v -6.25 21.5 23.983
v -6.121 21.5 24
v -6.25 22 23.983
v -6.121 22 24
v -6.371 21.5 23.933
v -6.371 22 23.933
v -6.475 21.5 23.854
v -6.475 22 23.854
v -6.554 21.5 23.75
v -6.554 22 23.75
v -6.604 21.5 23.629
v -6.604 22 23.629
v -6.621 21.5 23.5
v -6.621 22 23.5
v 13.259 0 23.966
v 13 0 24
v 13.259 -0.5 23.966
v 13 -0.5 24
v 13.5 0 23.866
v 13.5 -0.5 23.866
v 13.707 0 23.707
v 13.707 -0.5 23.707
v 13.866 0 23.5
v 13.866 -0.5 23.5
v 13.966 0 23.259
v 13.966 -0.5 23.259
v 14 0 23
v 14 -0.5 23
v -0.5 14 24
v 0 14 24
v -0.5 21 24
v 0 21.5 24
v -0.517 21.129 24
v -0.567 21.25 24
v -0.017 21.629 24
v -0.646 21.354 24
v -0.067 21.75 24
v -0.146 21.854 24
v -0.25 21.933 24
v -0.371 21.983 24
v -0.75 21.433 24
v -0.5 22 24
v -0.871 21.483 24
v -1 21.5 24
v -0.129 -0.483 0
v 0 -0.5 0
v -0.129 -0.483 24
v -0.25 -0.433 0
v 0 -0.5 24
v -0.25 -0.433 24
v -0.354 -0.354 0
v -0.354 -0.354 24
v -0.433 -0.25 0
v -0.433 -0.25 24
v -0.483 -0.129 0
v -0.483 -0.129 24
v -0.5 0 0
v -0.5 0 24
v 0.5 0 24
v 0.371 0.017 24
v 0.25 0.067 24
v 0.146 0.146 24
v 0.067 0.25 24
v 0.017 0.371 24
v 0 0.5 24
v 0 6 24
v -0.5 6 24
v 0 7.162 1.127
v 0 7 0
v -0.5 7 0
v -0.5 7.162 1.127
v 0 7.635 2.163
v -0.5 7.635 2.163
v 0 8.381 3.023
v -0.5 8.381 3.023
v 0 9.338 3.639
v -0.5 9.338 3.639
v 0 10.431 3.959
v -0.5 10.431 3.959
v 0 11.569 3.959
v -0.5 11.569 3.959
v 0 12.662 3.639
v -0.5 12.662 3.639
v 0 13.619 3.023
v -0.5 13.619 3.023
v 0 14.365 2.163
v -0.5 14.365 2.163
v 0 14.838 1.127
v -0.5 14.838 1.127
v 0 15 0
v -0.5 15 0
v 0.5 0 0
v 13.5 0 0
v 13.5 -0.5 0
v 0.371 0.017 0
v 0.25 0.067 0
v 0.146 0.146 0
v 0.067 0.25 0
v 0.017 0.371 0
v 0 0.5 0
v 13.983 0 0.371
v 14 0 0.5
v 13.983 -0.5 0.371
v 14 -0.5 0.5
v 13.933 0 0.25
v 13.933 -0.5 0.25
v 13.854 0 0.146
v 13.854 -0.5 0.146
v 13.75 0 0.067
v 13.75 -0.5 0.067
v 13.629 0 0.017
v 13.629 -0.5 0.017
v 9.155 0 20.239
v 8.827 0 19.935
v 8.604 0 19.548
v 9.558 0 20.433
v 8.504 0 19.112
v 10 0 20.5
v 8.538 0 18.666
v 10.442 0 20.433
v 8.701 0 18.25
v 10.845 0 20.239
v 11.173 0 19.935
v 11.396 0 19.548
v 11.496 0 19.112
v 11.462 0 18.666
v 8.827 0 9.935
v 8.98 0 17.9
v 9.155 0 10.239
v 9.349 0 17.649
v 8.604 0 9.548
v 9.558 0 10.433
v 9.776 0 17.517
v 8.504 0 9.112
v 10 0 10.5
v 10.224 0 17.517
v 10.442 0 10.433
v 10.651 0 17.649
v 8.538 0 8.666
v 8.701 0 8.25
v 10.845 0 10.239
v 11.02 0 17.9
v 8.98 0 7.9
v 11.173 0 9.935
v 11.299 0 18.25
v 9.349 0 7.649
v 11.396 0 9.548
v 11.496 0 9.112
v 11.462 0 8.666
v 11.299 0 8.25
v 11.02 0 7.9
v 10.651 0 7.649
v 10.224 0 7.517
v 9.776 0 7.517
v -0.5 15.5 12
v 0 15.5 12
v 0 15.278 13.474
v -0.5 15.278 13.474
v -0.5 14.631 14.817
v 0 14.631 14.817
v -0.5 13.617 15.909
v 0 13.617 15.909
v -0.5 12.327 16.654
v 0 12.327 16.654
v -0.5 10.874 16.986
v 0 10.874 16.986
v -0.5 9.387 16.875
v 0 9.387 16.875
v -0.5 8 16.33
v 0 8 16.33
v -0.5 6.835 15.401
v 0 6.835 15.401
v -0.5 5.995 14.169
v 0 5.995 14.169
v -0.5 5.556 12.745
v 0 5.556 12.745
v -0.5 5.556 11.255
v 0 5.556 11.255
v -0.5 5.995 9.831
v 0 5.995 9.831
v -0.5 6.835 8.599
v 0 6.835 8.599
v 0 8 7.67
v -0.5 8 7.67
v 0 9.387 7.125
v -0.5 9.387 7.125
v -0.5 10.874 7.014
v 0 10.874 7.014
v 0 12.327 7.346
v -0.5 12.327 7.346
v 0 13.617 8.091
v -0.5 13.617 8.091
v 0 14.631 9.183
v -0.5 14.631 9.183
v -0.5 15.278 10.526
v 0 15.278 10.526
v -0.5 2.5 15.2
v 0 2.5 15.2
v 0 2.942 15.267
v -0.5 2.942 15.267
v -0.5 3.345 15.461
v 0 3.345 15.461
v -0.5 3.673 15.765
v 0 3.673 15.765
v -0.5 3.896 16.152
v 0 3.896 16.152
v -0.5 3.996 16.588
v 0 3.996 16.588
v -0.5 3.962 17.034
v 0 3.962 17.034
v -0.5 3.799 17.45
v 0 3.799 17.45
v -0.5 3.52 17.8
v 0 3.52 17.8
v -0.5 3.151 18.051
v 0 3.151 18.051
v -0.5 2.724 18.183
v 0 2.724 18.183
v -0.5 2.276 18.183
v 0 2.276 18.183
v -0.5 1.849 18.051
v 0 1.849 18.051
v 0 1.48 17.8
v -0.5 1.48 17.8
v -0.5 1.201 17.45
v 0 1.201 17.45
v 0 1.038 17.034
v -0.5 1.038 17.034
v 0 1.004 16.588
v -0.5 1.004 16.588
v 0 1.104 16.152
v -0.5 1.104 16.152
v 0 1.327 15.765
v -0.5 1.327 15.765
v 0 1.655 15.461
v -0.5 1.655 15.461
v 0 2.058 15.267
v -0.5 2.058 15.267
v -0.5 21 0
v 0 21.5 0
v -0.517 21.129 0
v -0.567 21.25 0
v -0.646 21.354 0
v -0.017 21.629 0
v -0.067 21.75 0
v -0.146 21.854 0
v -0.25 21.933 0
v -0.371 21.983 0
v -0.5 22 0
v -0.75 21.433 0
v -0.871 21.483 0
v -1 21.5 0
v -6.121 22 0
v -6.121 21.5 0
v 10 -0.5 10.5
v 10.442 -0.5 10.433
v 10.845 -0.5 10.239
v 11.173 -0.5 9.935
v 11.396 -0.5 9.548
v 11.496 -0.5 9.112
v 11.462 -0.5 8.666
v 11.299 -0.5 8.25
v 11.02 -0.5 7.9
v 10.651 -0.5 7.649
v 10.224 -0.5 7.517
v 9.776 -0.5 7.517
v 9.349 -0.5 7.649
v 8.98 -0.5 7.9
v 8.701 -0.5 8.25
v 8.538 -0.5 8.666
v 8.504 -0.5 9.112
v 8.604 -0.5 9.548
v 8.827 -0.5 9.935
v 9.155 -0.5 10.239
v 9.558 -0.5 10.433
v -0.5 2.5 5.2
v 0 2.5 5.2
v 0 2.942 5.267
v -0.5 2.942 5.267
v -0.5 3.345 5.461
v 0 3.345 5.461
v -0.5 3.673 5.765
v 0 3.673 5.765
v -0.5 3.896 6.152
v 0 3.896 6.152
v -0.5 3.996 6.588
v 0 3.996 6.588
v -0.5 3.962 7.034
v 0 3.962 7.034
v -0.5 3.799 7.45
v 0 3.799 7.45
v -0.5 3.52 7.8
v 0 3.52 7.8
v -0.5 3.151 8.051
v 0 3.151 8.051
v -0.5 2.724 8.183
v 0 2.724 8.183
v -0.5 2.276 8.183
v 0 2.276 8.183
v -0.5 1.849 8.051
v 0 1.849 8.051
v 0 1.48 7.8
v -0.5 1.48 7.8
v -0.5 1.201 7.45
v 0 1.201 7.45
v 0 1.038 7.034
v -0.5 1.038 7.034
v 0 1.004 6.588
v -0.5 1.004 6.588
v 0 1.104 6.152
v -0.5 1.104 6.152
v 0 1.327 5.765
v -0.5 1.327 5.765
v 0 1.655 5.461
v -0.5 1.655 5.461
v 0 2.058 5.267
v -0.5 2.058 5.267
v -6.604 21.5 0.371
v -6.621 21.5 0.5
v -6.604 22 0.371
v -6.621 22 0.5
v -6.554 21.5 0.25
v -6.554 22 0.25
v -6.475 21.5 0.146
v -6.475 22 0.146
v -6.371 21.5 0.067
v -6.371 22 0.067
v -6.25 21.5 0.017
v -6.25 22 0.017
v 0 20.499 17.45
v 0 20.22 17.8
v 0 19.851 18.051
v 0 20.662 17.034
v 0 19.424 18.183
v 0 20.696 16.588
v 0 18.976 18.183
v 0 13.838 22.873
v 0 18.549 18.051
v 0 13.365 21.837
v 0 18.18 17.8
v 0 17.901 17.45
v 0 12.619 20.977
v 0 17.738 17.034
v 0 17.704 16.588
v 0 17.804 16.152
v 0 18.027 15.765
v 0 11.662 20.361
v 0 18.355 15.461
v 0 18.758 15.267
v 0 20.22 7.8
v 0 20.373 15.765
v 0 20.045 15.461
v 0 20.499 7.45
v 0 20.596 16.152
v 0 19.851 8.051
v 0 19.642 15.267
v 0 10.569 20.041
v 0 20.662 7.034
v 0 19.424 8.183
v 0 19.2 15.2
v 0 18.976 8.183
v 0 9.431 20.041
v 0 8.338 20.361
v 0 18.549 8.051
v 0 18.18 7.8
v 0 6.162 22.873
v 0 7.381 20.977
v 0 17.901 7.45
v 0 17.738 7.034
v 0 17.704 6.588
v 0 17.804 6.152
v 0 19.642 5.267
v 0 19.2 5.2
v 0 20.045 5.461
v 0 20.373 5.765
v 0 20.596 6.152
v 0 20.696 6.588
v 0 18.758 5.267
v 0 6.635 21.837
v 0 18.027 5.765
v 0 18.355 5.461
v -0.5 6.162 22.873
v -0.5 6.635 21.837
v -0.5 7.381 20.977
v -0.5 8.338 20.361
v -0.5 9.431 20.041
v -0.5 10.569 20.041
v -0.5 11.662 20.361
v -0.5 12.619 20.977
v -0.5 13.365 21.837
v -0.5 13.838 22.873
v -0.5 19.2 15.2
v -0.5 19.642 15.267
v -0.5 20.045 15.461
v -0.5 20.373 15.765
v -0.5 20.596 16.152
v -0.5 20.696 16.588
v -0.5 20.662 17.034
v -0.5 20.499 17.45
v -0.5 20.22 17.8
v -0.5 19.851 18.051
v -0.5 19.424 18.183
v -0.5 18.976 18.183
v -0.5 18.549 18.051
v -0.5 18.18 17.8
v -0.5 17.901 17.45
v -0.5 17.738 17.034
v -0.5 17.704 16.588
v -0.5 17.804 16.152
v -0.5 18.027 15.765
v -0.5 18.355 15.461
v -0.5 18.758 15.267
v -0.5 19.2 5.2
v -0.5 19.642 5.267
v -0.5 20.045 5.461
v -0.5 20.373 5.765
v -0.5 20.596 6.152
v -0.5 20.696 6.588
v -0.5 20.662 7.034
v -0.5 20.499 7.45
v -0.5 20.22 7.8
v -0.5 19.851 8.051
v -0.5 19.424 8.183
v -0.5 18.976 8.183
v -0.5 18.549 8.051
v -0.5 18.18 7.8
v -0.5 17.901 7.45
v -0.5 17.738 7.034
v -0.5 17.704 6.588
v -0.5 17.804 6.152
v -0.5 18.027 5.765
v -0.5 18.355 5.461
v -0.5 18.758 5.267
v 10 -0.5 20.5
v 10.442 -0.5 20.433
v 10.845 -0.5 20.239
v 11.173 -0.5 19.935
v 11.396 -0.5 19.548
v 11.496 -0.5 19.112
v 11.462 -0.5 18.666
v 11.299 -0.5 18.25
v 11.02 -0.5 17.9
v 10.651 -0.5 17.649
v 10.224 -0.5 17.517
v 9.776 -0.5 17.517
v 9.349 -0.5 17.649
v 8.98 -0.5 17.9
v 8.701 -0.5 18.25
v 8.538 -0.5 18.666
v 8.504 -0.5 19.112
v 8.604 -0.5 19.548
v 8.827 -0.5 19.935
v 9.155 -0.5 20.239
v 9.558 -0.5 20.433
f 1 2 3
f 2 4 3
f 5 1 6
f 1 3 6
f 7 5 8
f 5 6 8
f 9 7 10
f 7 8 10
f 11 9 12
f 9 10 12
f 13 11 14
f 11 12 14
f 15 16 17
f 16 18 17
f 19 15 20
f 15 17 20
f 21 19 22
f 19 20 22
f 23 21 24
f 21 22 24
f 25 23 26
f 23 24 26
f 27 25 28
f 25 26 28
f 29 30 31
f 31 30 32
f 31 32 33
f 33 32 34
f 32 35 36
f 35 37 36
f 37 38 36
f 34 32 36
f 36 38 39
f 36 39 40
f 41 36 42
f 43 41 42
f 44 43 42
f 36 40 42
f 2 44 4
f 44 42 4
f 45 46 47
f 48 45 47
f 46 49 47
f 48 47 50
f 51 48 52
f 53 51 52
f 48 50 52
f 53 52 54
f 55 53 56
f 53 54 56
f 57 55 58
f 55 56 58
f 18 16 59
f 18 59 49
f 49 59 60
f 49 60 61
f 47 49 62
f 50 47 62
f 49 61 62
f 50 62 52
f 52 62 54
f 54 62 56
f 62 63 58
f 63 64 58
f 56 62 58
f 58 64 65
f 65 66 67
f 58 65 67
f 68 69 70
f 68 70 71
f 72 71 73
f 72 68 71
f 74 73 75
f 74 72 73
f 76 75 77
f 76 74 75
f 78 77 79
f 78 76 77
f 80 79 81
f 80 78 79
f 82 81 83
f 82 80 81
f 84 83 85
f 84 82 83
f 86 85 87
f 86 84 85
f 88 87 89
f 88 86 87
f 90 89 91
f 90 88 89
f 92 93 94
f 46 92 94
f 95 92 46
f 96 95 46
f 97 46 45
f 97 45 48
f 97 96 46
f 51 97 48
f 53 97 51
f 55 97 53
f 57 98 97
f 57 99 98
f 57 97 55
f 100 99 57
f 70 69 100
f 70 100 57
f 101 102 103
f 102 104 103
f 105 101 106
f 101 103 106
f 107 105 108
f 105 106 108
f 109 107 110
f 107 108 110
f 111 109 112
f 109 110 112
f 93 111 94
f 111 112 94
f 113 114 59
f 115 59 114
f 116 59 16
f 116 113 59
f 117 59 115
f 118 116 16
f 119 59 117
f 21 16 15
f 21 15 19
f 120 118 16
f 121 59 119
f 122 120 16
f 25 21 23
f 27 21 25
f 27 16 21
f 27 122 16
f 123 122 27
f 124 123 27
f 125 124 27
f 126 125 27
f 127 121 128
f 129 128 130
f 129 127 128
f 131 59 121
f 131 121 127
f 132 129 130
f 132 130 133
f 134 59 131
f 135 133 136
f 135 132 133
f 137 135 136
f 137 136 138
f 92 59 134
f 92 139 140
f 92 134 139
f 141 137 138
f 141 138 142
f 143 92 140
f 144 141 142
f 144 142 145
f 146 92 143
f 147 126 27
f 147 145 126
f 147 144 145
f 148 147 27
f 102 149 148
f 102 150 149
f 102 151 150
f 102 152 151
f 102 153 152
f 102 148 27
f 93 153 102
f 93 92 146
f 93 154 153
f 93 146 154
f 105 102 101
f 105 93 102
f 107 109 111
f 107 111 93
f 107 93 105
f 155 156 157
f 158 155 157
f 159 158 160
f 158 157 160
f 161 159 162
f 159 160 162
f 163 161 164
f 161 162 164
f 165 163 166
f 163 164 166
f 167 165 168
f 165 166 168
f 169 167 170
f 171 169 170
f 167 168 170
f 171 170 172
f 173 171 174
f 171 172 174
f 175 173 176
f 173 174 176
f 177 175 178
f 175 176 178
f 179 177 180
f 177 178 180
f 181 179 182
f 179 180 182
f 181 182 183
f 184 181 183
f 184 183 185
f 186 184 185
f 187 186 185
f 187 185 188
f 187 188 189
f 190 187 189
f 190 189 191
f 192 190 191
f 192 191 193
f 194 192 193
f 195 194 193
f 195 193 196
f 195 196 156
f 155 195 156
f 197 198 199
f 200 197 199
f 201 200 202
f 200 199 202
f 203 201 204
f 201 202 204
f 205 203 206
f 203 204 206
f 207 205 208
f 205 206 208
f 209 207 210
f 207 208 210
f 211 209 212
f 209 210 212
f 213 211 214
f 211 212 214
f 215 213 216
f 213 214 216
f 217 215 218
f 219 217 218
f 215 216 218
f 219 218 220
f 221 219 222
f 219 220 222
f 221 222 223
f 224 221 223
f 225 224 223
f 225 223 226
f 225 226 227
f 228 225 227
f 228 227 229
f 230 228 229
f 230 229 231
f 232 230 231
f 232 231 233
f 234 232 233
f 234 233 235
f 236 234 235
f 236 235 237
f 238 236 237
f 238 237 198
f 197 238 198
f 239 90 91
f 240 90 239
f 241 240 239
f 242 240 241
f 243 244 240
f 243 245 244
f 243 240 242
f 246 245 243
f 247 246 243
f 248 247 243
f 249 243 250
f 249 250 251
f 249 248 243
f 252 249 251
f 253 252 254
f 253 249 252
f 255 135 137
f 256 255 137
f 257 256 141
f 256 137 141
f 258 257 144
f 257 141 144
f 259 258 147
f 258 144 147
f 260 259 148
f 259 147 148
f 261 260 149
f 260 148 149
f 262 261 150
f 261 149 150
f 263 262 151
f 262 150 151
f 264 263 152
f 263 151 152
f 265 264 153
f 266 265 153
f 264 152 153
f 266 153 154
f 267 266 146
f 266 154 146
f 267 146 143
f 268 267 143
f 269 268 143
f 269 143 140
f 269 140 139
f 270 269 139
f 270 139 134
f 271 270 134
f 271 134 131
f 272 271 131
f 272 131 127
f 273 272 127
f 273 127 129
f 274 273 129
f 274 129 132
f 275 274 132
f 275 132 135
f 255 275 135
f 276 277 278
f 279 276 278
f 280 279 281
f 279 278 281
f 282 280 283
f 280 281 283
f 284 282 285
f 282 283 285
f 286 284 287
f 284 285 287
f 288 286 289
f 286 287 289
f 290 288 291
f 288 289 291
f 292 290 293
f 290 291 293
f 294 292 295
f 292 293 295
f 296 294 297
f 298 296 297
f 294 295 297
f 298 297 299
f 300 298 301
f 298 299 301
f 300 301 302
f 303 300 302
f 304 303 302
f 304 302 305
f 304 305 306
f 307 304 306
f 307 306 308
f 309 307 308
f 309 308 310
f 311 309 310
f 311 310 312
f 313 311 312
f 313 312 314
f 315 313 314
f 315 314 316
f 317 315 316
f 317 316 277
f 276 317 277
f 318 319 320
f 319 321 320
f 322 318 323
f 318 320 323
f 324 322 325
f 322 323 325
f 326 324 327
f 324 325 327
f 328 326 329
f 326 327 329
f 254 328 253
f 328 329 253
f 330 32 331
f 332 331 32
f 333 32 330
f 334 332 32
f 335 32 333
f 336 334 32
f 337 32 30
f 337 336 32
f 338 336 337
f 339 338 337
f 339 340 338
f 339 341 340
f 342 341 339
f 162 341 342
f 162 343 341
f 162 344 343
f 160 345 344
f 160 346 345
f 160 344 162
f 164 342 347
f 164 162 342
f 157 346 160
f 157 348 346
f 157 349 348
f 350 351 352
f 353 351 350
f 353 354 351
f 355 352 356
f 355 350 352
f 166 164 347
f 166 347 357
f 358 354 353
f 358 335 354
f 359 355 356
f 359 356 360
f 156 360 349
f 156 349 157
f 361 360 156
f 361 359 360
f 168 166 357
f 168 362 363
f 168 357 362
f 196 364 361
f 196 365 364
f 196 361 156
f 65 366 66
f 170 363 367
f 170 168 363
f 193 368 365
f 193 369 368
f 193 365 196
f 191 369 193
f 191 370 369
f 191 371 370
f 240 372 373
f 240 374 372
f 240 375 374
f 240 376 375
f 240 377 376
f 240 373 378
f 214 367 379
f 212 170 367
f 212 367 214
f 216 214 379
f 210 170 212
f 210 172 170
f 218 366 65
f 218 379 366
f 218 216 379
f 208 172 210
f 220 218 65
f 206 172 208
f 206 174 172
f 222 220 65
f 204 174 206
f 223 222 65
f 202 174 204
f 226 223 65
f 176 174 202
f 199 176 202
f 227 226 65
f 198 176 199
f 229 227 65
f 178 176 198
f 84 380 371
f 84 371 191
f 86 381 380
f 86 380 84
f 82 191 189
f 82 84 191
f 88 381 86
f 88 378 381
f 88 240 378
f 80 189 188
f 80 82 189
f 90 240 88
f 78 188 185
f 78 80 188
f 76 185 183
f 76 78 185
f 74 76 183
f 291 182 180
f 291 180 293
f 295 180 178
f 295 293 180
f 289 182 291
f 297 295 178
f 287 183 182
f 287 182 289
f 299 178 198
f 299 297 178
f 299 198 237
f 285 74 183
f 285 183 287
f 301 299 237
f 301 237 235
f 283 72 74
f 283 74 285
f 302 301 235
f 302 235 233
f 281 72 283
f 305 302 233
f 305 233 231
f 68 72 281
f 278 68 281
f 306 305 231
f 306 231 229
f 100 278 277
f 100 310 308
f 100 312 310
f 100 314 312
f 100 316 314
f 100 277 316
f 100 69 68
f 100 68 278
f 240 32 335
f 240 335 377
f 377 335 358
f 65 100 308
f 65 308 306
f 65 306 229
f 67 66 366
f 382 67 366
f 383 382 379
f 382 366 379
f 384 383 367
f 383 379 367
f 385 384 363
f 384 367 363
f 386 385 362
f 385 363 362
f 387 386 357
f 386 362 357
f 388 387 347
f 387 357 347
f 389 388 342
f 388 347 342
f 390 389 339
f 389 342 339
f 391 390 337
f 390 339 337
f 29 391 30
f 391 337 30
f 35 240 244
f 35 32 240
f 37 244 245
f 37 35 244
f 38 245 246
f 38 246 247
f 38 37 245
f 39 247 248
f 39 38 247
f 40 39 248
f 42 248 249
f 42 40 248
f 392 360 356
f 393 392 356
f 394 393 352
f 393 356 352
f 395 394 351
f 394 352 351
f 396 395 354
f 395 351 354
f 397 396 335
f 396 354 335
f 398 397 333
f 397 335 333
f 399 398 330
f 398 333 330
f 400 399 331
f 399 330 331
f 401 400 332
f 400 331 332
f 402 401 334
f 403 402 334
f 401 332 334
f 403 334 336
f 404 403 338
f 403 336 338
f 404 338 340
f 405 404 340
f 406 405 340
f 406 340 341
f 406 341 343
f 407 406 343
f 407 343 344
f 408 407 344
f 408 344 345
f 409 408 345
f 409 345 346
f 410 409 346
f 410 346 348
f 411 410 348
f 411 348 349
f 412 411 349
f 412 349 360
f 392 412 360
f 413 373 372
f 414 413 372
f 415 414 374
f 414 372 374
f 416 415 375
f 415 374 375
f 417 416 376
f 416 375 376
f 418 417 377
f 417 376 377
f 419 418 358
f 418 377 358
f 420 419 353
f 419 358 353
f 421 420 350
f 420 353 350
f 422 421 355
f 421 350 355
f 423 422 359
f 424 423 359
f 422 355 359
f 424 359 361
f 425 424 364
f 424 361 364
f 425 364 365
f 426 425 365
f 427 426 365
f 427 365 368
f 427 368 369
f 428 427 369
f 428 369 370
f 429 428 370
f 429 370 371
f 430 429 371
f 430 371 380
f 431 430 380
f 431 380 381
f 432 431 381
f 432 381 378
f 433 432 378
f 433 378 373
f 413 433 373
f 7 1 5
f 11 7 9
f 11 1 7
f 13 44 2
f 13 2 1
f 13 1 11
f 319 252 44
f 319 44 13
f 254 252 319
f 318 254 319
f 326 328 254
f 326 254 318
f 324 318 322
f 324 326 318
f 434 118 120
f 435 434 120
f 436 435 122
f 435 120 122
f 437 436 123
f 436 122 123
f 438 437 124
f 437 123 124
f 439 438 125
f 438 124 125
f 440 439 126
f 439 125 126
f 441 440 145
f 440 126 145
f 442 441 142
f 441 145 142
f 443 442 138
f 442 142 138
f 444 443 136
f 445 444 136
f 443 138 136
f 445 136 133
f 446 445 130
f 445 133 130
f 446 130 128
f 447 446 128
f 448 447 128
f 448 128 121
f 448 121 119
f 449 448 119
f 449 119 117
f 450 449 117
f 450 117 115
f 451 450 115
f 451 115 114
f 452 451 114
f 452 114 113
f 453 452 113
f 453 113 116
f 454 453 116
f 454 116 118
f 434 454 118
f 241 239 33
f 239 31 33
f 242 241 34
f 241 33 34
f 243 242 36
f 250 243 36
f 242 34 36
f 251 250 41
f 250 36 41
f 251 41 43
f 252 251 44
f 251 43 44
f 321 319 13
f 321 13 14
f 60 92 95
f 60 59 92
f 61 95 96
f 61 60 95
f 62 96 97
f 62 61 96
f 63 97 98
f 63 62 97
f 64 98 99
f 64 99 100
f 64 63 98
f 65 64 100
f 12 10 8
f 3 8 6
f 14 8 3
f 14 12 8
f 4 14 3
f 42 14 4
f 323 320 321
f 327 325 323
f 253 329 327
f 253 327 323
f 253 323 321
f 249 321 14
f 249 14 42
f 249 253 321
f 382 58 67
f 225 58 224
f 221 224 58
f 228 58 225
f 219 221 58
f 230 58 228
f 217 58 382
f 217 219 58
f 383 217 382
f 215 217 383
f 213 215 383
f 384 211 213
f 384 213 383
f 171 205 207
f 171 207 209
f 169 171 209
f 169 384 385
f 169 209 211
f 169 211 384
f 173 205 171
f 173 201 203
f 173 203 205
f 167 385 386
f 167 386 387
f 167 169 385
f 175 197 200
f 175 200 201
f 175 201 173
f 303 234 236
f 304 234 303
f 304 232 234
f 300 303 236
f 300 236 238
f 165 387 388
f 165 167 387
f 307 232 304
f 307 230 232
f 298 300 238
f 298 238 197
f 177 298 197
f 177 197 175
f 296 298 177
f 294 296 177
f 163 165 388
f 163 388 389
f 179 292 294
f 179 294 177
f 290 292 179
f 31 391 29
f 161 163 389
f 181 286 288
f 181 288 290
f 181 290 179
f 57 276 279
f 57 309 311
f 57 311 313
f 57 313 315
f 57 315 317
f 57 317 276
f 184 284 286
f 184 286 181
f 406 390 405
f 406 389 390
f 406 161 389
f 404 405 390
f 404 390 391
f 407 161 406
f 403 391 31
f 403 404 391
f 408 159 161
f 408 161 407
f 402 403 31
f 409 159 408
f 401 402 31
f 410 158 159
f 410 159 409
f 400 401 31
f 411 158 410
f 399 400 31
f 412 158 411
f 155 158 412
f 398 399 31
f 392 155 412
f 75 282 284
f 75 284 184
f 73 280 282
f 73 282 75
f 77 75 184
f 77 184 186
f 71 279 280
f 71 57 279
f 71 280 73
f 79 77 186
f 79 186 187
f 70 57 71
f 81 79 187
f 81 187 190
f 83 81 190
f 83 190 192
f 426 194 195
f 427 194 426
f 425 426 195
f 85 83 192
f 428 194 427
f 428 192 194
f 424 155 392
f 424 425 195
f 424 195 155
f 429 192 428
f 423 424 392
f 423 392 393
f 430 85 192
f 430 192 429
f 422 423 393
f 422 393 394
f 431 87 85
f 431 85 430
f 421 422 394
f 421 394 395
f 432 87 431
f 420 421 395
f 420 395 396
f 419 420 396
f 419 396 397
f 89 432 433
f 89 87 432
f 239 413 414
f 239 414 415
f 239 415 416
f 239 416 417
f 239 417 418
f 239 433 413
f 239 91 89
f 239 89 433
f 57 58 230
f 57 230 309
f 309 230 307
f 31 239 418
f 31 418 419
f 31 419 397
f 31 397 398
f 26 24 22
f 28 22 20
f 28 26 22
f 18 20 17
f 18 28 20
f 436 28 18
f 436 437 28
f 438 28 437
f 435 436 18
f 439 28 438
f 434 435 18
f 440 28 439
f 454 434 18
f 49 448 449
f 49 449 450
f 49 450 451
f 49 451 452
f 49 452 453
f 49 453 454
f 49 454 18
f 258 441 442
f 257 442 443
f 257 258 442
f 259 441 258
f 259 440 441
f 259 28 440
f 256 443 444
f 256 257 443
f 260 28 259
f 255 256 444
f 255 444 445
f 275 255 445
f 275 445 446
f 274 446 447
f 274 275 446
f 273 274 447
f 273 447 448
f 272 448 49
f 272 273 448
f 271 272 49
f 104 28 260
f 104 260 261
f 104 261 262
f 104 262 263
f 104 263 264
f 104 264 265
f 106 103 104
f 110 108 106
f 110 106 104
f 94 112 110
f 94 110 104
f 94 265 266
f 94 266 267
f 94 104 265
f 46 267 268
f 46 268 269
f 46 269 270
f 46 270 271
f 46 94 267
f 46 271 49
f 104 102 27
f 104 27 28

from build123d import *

# Parameters (mm, degrees)
EXTRUDE_THIN1_DEPTH = 24
SKETCH2_R           = 1.5
CUT_EXTRUDE1_DEPTH  = 10
SKETCH3_R           = 1.5
CUT_EXTRUDE2_DEPTH  = 10
FILLET1_R           = 1
FILLET2_R           = 0.5
FILLET3_R           = 0.5
SKETCH4_R           = 5
CUT_EXTRUDE3_DEPTH  = 10
CUT_EXTRUDE5_DEPTH  = 10


with BuildPart() as part:
    # Sketch1 → Extrude-Thin1 (new body)
    with BuildSketch(Plane.XY):
        Polygon((-6.621018809, 22), (0, 22), (0, 0), (14, 0), (14, -0.5), (-0.5, -0.5), (-0.5, 21.5), (-6.621018809, 21.5), align=None)
    extrude(amount=EXTRUDE_THIN1_DEPTH)

    # Sketch2 → Cut-Extrude1 (cut)
    with BuildSketch(Plane(origin=(0, 0, 0), x_dir=(1, 0, 0), z_dir=(0, 1, 0))):
        with Locations(Location((10, -19, 0), (0, 0, 270))):
            Circle(SKETCH2_R)
        with Locations(Location((10, -9, 0), (0, 0, 270))):
            Circle(SKETCH2_R)
    extrude(amount=-CUT_EXTRUDE1_DEPTH, mode=Mode.SUBTRACT)

    # Sketch3 → Cut-Extrude2 (cut)
    with BuildSketch(Plane(origin=(0, 0, 0), x_dir=(0, 0, -1), z_dir=(1, 0, 0))):
        with Locations((-16.7, 19.2)):
            Circle(SKETCH3_R)
        with Locations((-16.7, 2.5)):
            Circle(SKETCH3_R)
        with Locations((-6.7, 19.2)):
            Circle(SKETCH3_R)
        with Locations((-6.7, 2.5)):
            Circle(SKETCH3_R)
    extrude(amount=-CUT_EXTRUDE2_DEPTH, mode=Mode.SUBTRACT)

    # Fillet1
    fillet1_edges = [part.edges().sort_by_distance(p)[0] for p in [
        (14, -0.25, 24),
    ]]
    fillet(fillet1_edges, radius=FILLET1_R)

    # Fillet2
    fillet2_edges = [part.edges().sort_by_distance(p)[0] for p in [
        (-0.5, -0.5, 12),
        (-0.5, 21.5, 12),
        (0, 0, 12),
        (-6.621018809, 21.75, 24),
        (-6.621018809, 21.75, 0),
        (14, -0.25, 0),
    ]]
    fillet(fillet2_edges, radius=FILLET2_R)

    # Fillet3
    fillet3_edges = [part.edges().sort_by_distance(p)[0] for p in [
        (0, 22, 12),
    ]]
    fillet(fillet3_edges, radius=FILLET3_R)

    # Sketch4 → Cut-Extrude3 (cut)
    with BuildSketch(Plane(origin=(0, 0, 0), x_dir=(0, 0, -1), z_dir=(1, 0, 0))):
        with Locations(Location((-12, 10.5, 0), (0, 0, 90))):
            Circle(SKETCH4_R)
    extrude(amount=-CUT_EXTRUDE3_DEPTH, mode=Mode.SUBTRACT)

    # Sketch5 → Cut-Extrude5 (cut)
    with BuildSketch(Plane(origin=(0, 0, 0), x_dir=(0, 0, -1), z_dir=(1, 0, 0))):
        with BuildLine():
            Line((0, 15), (0, 7))
            ThreePointArc((0, 7), (-4, 11), (0, 15))
        make_face()
        with BuildLine():
            Line((-24, 14), (-24, 6))
            ThreePointArc((-24, 6), (-20, 10), (-24, 14))
        make_face()
    extrude(amount=-CUT_EXTRUDE5_DEPTH, mode=Mode.SUBTRACT)


solid = part.part
